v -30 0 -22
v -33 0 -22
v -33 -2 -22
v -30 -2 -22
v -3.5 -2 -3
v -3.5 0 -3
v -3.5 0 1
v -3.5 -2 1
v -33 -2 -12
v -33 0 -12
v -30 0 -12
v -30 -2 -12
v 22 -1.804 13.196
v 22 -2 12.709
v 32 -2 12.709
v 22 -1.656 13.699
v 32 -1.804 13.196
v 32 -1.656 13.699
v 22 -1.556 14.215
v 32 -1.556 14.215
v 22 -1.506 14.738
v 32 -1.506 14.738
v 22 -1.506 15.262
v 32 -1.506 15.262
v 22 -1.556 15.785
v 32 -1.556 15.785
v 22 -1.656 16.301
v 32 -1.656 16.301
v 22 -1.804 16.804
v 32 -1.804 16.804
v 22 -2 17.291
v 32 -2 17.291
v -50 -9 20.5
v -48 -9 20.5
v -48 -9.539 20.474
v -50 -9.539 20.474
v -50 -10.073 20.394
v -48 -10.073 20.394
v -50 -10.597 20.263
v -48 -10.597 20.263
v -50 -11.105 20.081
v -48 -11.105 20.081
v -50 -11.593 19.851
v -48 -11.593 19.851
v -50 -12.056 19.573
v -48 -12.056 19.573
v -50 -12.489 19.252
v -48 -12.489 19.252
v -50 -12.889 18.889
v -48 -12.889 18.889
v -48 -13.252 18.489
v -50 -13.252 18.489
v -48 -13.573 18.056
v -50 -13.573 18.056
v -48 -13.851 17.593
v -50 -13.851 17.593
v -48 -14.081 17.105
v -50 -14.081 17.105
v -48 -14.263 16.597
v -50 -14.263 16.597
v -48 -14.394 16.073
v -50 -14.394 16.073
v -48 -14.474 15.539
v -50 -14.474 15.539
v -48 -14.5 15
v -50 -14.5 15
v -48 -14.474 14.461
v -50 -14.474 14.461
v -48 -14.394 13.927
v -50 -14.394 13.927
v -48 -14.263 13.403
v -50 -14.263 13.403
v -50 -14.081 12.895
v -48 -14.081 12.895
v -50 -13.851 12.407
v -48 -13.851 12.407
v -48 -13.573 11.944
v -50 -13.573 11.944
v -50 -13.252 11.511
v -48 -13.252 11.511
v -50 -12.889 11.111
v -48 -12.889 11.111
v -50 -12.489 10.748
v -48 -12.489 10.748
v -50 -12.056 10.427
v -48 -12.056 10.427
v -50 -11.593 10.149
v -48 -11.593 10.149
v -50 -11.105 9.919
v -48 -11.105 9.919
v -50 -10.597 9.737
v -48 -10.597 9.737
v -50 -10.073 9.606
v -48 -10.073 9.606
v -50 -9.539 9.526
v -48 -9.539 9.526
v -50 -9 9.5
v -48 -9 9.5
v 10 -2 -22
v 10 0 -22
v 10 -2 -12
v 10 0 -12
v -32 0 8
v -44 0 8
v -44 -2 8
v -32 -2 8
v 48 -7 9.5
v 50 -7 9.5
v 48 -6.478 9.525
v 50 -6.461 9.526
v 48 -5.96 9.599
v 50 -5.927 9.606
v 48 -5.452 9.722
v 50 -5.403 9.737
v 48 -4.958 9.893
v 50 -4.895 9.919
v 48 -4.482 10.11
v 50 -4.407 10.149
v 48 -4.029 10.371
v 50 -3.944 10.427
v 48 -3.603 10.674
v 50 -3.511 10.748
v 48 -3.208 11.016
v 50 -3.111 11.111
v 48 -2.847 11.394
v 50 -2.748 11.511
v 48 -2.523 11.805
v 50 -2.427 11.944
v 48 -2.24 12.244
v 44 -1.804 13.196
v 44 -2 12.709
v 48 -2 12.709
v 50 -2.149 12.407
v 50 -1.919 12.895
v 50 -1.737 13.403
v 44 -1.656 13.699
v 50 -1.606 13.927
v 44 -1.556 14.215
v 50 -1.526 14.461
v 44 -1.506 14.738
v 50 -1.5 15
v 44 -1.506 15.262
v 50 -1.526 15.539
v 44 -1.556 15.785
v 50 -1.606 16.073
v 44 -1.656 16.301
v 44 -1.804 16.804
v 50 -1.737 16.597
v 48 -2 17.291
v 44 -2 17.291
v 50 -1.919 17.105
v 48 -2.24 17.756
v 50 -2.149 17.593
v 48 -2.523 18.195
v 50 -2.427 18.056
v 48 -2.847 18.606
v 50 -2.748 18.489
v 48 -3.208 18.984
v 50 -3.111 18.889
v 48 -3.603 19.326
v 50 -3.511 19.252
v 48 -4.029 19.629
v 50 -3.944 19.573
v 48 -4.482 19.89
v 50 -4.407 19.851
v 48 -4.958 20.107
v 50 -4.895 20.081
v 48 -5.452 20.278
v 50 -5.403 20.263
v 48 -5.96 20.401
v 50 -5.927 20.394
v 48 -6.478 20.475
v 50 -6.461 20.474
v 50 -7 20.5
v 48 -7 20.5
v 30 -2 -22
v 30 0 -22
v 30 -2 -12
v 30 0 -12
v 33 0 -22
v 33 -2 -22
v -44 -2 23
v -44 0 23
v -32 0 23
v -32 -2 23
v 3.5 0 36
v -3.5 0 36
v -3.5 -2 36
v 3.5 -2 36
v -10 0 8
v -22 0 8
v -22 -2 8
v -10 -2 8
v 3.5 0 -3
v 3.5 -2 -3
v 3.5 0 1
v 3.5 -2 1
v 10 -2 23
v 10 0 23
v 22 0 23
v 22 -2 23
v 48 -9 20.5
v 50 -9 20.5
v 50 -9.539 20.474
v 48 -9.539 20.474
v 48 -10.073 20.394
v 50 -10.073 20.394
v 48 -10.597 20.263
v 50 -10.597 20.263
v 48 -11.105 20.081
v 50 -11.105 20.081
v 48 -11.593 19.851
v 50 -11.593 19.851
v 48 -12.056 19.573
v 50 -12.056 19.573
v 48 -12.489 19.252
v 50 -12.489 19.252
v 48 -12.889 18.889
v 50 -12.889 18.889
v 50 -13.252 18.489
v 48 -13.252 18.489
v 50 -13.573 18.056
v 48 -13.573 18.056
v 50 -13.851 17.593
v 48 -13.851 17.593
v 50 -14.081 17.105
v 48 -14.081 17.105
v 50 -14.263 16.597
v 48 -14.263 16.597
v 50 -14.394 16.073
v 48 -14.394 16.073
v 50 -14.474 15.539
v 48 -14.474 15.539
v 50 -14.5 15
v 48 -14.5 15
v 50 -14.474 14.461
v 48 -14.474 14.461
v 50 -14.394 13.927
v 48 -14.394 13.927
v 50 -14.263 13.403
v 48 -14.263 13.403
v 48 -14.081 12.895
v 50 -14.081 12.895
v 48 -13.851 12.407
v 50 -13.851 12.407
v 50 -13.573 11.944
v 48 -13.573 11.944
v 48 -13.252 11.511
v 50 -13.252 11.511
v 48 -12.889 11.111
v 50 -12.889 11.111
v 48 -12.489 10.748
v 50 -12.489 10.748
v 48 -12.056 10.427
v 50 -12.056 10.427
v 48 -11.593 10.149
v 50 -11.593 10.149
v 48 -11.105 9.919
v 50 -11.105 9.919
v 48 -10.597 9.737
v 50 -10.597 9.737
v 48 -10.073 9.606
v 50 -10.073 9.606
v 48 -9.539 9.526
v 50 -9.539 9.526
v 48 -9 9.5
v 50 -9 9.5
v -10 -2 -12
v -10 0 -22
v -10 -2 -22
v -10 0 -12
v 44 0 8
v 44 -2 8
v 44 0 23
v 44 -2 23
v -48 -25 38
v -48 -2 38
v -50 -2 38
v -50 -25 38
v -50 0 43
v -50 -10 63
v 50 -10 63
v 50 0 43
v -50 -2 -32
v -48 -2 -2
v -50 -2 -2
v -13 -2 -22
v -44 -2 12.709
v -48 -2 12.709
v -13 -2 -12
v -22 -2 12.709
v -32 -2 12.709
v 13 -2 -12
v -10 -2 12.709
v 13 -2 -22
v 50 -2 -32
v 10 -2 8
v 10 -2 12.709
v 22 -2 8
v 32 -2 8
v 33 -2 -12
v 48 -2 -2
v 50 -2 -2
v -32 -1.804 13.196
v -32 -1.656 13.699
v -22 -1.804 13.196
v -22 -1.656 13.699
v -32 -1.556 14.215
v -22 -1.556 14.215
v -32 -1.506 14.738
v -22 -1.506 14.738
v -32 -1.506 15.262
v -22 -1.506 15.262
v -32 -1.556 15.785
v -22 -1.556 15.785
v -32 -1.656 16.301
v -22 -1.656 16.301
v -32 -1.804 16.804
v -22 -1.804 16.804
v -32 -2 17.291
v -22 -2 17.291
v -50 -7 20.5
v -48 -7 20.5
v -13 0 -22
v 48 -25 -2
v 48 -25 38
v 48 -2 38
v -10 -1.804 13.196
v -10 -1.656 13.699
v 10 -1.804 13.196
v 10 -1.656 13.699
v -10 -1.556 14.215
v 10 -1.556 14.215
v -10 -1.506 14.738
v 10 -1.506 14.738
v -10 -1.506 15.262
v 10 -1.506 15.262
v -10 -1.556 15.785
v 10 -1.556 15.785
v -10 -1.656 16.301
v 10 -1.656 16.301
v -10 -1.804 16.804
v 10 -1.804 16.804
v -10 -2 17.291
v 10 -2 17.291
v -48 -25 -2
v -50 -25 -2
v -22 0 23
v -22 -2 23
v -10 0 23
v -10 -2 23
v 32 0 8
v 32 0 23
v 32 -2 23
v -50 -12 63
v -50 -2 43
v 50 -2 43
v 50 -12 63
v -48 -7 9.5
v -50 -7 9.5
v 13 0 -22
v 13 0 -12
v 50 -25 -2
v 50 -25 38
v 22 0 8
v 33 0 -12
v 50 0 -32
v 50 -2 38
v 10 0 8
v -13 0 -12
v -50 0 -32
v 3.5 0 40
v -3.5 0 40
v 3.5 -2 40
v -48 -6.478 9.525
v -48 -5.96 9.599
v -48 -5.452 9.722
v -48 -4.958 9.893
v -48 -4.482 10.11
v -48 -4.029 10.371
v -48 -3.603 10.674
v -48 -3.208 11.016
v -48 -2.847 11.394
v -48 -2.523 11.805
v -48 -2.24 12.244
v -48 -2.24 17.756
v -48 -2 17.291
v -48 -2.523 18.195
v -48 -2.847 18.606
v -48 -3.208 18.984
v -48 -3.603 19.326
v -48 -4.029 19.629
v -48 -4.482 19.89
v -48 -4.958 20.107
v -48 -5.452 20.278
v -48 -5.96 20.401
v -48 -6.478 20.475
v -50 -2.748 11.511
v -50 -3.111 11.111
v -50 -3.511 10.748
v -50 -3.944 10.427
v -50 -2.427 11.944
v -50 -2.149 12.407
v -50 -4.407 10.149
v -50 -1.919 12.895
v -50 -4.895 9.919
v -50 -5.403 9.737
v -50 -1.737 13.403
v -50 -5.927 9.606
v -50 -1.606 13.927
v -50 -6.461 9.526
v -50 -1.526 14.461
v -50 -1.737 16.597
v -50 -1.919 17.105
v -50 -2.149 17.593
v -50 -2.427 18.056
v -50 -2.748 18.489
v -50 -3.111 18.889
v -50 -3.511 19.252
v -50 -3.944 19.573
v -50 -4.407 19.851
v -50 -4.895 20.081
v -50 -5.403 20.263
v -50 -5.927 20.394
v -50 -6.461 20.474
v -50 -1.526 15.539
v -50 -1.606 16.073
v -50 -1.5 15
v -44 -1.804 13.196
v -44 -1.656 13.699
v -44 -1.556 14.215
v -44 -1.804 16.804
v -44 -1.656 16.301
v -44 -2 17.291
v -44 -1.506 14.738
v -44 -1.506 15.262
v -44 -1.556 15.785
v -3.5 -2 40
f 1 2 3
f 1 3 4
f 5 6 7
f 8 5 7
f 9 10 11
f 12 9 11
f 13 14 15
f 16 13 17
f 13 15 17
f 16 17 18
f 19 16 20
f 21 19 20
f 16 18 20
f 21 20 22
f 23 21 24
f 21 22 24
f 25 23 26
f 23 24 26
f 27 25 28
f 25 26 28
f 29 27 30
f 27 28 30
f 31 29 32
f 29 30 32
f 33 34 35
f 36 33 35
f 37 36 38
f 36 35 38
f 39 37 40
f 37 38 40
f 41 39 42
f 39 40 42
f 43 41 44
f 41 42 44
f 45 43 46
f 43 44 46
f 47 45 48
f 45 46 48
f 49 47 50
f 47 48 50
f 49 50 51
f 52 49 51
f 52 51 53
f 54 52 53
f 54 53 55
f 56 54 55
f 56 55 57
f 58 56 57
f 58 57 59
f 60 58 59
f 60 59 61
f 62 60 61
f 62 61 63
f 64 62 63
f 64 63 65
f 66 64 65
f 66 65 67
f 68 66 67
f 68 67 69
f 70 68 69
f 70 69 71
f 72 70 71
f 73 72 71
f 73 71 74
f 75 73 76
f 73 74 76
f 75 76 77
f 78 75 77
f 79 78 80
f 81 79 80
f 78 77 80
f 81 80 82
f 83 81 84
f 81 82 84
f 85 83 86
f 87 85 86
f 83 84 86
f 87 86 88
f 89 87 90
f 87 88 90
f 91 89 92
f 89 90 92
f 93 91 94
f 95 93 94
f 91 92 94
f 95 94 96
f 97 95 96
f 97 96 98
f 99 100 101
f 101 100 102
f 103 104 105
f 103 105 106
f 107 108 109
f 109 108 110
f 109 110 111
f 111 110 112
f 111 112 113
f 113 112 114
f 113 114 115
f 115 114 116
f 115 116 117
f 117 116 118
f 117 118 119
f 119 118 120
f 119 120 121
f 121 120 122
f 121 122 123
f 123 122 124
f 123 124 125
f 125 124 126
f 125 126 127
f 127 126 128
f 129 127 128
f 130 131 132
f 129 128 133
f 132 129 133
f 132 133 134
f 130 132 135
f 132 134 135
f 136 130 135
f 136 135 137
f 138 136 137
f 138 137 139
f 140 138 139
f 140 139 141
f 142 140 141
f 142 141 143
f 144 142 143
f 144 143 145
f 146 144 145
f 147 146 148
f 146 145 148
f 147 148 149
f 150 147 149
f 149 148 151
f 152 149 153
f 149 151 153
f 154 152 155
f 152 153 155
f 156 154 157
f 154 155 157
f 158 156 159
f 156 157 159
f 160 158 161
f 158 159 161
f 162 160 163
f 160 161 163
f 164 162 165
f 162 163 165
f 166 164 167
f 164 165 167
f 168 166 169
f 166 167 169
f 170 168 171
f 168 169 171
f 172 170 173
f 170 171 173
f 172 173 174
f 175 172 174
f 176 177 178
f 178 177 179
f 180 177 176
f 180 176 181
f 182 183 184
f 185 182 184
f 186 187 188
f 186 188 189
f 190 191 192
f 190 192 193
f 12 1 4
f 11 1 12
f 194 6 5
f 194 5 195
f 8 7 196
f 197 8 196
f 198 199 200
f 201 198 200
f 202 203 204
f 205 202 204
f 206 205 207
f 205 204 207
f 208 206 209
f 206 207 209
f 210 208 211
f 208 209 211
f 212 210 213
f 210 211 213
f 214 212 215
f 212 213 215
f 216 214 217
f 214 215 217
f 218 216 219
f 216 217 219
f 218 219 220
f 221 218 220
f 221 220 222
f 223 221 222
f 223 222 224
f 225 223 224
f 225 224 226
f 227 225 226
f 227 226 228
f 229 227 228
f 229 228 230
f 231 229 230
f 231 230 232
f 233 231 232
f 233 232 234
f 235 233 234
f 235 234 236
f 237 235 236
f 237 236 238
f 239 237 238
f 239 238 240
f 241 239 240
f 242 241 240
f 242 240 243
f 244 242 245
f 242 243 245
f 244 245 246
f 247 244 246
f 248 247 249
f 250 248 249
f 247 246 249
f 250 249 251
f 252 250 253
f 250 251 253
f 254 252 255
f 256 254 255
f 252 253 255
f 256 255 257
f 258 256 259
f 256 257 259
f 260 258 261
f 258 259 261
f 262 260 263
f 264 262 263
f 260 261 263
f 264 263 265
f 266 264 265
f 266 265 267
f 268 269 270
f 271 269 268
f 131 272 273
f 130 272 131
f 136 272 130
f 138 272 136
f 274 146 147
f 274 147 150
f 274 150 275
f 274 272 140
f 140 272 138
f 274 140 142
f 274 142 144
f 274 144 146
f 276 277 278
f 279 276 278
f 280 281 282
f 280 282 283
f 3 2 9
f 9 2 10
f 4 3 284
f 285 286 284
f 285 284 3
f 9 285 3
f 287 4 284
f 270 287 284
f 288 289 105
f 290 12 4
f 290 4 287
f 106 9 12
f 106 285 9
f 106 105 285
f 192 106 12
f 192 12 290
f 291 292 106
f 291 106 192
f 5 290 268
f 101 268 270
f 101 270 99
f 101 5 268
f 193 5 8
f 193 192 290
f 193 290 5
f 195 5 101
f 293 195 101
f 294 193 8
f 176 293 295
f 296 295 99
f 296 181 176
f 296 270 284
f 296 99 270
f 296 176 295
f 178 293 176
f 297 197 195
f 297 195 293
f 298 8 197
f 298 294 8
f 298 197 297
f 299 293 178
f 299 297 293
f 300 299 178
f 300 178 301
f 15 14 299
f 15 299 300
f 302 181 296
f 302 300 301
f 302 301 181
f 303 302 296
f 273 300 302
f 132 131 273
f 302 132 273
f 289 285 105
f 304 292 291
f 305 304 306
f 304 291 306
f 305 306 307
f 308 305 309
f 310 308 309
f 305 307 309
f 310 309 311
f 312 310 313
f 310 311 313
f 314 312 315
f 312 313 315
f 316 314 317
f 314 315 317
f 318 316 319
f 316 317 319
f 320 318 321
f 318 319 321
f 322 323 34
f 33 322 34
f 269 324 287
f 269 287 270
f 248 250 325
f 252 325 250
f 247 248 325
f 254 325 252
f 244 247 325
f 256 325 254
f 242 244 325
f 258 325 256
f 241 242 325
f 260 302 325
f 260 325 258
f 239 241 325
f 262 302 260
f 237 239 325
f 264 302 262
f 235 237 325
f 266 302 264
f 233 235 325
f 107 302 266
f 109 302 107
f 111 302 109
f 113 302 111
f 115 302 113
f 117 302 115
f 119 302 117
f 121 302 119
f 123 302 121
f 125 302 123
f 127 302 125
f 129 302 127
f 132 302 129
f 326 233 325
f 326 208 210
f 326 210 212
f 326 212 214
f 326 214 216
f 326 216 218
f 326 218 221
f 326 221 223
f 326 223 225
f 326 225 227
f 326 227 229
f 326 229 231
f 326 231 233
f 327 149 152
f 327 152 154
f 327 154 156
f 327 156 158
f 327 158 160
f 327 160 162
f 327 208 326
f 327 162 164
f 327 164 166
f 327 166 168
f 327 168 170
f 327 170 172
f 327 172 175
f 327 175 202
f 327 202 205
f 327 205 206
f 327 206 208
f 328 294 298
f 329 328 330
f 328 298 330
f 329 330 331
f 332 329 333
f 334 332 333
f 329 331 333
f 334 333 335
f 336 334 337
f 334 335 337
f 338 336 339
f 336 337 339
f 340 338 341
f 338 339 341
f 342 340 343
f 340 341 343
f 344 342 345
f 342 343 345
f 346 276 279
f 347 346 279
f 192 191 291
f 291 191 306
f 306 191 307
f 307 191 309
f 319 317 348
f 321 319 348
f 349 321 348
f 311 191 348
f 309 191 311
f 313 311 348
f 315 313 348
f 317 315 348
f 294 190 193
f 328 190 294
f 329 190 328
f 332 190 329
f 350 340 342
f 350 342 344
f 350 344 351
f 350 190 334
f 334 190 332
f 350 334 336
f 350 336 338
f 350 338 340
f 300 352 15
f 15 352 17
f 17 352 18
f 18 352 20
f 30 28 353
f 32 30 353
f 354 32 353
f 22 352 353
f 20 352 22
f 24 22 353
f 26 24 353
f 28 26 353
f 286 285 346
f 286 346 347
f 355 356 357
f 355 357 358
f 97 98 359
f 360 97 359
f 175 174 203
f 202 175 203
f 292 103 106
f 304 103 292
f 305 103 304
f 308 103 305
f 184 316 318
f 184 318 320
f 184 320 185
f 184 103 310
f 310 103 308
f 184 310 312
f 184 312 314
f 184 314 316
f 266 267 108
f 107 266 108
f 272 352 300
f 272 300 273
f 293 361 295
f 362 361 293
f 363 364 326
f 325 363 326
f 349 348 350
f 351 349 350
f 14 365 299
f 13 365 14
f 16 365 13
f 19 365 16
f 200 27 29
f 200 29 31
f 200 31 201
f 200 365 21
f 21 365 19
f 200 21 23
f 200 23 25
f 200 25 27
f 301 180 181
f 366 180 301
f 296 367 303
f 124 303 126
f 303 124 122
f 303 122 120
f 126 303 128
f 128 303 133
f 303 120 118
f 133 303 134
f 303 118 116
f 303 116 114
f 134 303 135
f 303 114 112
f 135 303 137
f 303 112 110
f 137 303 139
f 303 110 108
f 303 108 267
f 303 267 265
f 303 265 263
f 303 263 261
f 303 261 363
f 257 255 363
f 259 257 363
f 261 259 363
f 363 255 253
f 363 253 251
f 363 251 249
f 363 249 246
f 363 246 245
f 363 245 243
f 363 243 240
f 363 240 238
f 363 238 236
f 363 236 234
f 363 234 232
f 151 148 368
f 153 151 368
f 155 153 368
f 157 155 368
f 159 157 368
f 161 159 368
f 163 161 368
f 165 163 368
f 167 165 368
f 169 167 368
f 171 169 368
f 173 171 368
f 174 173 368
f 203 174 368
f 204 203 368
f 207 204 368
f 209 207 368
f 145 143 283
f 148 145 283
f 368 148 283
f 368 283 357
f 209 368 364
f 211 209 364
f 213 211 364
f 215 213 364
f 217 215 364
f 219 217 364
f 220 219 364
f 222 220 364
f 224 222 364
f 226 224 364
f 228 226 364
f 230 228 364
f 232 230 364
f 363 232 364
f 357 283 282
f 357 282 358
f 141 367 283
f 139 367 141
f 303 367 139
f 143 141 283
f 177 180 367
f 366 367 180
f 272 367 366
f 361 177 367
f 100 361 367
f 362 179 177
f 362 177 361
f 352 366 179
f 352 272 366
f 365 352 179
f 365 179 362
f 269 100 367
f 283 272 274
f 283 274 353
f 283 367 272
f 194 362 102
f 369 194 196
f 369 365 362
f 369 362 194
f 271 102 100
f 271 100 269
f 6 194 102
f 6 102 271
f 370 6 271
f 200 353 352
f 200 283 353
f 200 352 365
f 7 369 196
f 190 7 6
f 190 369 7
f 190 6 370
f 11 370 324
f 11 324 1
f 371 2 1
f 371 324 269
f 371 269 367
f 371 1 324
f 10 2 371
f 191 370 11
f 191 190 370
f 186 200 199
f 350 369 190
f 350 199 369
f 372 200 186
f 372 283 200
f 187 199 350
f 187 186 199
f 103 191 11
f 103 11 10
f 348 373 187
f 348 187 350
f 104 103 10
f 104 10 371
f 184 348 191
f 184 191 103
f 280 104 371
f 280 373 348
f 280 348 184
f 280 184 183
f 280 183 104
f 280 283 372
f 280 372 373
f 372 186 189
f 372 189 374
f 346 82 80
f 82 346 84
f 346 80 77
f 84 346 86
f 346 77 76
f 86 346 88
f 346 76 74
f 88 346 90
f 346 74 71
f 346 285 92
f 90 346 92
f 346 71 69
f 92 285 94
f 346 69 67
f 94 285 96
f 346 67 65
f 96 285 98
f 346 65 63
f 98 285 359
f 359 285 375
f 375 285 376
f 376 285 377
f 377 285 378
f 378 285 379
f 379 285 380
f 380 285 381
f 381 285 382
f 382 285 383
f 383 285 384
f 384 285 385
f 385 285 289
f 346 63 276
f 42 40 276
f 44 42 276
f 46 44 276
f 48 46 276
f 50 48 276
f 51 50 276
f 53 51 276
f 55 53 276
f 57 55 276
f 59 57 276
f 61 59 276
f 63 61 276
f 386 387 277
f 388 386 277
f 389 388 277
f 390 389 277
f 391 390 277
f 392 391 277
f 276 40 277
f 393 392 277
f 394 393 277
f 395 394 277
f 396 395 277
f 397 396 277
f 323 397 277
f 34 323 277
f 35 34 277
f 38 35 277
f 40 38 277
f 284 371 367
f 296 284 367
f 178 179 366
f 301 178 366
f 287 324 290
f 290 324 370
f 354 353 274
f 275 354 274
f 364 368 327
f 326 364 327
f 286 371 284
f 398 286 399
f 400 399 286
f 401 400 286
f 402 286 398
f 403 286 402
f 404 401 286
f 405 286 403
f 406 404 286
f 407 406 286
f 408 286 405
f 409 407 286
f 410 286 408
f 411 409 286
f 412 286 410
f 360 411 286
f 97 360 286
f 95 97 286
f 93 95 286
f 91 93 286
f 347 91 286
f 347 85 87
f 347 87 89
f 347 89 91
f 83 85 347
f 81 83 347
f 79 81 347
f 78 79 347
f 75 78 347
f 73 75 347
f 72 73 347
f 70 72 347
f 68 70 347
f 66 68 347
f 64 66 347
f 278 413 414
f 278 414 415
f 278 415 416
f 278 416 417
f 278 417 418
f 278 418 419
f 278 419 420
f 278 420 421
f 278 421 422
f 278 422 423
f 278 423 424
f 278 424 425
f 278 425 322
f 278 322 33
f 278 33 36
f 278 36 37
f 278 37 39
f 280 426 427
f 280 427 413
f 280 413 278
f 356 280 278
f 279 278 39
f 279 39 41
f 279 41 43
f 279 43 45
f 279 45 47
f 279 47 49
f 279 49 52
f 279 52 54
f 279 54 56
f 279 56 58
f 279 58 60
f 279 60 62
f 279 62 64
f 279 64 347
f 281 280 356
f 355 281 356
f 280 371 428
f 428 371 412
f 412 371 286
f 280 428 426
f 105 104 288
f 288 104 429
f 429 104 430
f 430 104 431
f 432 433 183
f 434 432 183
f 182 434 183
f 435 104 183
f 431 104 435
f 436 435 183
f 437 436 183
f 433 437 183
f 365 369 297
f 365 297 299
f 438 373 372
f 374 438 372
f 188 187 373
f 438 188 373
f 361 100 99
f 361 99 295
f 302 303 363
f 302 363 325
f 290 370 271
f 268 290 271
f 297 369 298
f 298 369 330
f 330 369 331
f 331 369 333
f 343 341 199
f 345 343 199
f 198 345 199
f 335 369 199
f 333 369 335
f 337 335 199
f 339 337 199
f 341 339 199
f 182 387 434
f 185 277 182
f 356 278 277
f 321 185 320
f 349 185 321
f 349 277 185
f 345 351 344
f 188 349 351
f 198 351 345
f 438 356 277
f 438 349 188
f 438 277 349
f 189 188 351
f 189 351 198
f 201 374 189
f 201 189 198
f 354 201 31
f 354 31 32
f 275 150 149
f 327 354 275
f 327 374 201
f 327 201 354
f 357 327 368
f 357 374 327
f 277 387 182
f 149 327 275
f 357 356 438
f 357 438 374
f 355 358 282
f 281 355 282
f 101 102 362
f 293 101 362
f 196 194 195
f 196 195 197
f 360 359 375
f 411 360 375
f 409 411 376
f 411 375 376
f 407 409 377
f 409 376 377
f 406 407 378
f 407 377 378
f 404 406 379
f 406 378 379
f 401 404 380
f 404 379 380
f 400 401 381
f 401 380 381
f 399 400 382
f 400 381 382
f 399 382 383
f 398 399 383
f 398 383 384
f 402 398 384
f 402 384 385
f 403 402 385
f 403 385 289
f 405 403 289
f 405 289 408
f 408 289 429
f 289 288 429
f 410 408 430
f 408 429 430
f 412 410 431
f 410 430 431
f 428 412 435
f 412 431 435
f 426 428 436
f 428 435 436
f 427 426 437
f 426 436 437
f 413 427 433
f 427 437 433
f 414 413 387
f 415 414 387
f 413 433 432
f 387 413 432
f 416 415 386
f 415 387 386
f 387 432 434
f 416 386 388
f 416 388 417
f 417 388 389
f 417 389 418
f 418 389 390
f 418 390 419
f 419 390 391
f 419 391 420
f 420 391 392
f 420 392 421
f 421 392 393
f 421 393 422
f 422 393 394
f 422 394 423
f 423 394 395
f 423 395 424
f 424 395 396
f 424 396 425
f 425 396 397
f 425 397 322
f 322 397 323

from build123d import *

# Parameters (mm, degrees)
F0_W     = 100
F0_H     = 75
F0_W_2   = 3
F0_H_2   = 10
F0_W_3   = 7
F0_H_3   = 4
F0_W_4   = 12
F0_H_4   = 15
F1_DEPTH = 2
F2_W     = 2
F2_H     = 40
F3_DEPTH = 25
F5_DEPTH = 100
F7_DEPTH = 100


with BuildPart() as f1:
    # F0 (on Front) → F1 (new body)
    with BuildSketch(Plane.XZ):
        with Locations((0, 5.5)):
            Rectangle(F0_W, F0_H)
        with Locations((-31.5, -17)):
            Rectangle(F0_W_2, F0_H_2, mode=Mode.SUBTRACT)
        with Locations((-11.5, -17)):
            Rectangle(F0_W_2, F0_H_2, mode=Mode.SUBTRACT)
        with Locations((11.5, -17)):
            Rectangle(F0_W_2, F0_H_2, mode=Mode.SUBTRACT)
        with Locations((31.5, -17)):
            Rectangle(F0_W_2, F0_H_2, mode=Mode.SUBTRACT)
        with Locations((0, -1)):
            Rectangle(F0_W_3, F0_H_3, mode=Mode.SUBTRACT)
        with Locations((-38, 15.5)):
            Rectangle(F0_W_4, F0_H_4, mode=Mode.SUBTRACT)
        with Locations((-16, 15.5)):
            Rectangle(F0_W_4, F0_H_4, mode=Mode.SUBTRACT)
        with Locations((16, 15.5)):
            Rectangle(F0_W_4, F0_H_4, mode=Mode.SUBTRACT)
        with Locations((38, 15.5)):
            Rectangle(F0_W_4, F0_H_4, mode=Mode.SUBTRACT)
        with Locations((0, 38)):
            Rectangle(F0_W_3, F0_H_3, mode=Mode.SUBTRACT)
    extrude(amount=F1_DEPTH)

    # F2 (on face) → F3 (join)
    with BuildSketch(Plane(origin=(0, 0, 0), x_dir=(-1, 0, 0), z_dir=(0, 1, 0))):
        with Locations((-49, 18)):
            Rectangle(F2_W, F2_H)
        with Locations((49, 18)):
            Rectangle(F2_W, F2_H)
    extrude(amount=-F3_DEPTH)

    # F4 (on face) → F5 (join)
    with BuildSketch(Plane(origin=(-50, 0, 0), x_dir=(0, -1, 0), z_dir=(-1, 0, 0))):
        Polygon((0, 43), (2, 43), (12, 63), (10, 63), align=None)
    extrude(amount=-F5_DEPTH)

    # F6 (on face) → F7 (cut)
    with BuildSketch(Plane.YZ.offset(50)):
        with BuildLine():
            Line((-7, 20.5), (-9, 20.5))
            ThreePointArc((-9, 20.5), (-14.5, 15), (-9, 9.5))
            Line((-9, 9.5), (-7, 9.5))
            ThreePointArc((-7, 9.5), (-1.5, 15), (-7, 20.5))
        make_face()
    extrude(amount=-F7_DEPTH, mode=Mode.SUBTRACT)


solid = f1.part
